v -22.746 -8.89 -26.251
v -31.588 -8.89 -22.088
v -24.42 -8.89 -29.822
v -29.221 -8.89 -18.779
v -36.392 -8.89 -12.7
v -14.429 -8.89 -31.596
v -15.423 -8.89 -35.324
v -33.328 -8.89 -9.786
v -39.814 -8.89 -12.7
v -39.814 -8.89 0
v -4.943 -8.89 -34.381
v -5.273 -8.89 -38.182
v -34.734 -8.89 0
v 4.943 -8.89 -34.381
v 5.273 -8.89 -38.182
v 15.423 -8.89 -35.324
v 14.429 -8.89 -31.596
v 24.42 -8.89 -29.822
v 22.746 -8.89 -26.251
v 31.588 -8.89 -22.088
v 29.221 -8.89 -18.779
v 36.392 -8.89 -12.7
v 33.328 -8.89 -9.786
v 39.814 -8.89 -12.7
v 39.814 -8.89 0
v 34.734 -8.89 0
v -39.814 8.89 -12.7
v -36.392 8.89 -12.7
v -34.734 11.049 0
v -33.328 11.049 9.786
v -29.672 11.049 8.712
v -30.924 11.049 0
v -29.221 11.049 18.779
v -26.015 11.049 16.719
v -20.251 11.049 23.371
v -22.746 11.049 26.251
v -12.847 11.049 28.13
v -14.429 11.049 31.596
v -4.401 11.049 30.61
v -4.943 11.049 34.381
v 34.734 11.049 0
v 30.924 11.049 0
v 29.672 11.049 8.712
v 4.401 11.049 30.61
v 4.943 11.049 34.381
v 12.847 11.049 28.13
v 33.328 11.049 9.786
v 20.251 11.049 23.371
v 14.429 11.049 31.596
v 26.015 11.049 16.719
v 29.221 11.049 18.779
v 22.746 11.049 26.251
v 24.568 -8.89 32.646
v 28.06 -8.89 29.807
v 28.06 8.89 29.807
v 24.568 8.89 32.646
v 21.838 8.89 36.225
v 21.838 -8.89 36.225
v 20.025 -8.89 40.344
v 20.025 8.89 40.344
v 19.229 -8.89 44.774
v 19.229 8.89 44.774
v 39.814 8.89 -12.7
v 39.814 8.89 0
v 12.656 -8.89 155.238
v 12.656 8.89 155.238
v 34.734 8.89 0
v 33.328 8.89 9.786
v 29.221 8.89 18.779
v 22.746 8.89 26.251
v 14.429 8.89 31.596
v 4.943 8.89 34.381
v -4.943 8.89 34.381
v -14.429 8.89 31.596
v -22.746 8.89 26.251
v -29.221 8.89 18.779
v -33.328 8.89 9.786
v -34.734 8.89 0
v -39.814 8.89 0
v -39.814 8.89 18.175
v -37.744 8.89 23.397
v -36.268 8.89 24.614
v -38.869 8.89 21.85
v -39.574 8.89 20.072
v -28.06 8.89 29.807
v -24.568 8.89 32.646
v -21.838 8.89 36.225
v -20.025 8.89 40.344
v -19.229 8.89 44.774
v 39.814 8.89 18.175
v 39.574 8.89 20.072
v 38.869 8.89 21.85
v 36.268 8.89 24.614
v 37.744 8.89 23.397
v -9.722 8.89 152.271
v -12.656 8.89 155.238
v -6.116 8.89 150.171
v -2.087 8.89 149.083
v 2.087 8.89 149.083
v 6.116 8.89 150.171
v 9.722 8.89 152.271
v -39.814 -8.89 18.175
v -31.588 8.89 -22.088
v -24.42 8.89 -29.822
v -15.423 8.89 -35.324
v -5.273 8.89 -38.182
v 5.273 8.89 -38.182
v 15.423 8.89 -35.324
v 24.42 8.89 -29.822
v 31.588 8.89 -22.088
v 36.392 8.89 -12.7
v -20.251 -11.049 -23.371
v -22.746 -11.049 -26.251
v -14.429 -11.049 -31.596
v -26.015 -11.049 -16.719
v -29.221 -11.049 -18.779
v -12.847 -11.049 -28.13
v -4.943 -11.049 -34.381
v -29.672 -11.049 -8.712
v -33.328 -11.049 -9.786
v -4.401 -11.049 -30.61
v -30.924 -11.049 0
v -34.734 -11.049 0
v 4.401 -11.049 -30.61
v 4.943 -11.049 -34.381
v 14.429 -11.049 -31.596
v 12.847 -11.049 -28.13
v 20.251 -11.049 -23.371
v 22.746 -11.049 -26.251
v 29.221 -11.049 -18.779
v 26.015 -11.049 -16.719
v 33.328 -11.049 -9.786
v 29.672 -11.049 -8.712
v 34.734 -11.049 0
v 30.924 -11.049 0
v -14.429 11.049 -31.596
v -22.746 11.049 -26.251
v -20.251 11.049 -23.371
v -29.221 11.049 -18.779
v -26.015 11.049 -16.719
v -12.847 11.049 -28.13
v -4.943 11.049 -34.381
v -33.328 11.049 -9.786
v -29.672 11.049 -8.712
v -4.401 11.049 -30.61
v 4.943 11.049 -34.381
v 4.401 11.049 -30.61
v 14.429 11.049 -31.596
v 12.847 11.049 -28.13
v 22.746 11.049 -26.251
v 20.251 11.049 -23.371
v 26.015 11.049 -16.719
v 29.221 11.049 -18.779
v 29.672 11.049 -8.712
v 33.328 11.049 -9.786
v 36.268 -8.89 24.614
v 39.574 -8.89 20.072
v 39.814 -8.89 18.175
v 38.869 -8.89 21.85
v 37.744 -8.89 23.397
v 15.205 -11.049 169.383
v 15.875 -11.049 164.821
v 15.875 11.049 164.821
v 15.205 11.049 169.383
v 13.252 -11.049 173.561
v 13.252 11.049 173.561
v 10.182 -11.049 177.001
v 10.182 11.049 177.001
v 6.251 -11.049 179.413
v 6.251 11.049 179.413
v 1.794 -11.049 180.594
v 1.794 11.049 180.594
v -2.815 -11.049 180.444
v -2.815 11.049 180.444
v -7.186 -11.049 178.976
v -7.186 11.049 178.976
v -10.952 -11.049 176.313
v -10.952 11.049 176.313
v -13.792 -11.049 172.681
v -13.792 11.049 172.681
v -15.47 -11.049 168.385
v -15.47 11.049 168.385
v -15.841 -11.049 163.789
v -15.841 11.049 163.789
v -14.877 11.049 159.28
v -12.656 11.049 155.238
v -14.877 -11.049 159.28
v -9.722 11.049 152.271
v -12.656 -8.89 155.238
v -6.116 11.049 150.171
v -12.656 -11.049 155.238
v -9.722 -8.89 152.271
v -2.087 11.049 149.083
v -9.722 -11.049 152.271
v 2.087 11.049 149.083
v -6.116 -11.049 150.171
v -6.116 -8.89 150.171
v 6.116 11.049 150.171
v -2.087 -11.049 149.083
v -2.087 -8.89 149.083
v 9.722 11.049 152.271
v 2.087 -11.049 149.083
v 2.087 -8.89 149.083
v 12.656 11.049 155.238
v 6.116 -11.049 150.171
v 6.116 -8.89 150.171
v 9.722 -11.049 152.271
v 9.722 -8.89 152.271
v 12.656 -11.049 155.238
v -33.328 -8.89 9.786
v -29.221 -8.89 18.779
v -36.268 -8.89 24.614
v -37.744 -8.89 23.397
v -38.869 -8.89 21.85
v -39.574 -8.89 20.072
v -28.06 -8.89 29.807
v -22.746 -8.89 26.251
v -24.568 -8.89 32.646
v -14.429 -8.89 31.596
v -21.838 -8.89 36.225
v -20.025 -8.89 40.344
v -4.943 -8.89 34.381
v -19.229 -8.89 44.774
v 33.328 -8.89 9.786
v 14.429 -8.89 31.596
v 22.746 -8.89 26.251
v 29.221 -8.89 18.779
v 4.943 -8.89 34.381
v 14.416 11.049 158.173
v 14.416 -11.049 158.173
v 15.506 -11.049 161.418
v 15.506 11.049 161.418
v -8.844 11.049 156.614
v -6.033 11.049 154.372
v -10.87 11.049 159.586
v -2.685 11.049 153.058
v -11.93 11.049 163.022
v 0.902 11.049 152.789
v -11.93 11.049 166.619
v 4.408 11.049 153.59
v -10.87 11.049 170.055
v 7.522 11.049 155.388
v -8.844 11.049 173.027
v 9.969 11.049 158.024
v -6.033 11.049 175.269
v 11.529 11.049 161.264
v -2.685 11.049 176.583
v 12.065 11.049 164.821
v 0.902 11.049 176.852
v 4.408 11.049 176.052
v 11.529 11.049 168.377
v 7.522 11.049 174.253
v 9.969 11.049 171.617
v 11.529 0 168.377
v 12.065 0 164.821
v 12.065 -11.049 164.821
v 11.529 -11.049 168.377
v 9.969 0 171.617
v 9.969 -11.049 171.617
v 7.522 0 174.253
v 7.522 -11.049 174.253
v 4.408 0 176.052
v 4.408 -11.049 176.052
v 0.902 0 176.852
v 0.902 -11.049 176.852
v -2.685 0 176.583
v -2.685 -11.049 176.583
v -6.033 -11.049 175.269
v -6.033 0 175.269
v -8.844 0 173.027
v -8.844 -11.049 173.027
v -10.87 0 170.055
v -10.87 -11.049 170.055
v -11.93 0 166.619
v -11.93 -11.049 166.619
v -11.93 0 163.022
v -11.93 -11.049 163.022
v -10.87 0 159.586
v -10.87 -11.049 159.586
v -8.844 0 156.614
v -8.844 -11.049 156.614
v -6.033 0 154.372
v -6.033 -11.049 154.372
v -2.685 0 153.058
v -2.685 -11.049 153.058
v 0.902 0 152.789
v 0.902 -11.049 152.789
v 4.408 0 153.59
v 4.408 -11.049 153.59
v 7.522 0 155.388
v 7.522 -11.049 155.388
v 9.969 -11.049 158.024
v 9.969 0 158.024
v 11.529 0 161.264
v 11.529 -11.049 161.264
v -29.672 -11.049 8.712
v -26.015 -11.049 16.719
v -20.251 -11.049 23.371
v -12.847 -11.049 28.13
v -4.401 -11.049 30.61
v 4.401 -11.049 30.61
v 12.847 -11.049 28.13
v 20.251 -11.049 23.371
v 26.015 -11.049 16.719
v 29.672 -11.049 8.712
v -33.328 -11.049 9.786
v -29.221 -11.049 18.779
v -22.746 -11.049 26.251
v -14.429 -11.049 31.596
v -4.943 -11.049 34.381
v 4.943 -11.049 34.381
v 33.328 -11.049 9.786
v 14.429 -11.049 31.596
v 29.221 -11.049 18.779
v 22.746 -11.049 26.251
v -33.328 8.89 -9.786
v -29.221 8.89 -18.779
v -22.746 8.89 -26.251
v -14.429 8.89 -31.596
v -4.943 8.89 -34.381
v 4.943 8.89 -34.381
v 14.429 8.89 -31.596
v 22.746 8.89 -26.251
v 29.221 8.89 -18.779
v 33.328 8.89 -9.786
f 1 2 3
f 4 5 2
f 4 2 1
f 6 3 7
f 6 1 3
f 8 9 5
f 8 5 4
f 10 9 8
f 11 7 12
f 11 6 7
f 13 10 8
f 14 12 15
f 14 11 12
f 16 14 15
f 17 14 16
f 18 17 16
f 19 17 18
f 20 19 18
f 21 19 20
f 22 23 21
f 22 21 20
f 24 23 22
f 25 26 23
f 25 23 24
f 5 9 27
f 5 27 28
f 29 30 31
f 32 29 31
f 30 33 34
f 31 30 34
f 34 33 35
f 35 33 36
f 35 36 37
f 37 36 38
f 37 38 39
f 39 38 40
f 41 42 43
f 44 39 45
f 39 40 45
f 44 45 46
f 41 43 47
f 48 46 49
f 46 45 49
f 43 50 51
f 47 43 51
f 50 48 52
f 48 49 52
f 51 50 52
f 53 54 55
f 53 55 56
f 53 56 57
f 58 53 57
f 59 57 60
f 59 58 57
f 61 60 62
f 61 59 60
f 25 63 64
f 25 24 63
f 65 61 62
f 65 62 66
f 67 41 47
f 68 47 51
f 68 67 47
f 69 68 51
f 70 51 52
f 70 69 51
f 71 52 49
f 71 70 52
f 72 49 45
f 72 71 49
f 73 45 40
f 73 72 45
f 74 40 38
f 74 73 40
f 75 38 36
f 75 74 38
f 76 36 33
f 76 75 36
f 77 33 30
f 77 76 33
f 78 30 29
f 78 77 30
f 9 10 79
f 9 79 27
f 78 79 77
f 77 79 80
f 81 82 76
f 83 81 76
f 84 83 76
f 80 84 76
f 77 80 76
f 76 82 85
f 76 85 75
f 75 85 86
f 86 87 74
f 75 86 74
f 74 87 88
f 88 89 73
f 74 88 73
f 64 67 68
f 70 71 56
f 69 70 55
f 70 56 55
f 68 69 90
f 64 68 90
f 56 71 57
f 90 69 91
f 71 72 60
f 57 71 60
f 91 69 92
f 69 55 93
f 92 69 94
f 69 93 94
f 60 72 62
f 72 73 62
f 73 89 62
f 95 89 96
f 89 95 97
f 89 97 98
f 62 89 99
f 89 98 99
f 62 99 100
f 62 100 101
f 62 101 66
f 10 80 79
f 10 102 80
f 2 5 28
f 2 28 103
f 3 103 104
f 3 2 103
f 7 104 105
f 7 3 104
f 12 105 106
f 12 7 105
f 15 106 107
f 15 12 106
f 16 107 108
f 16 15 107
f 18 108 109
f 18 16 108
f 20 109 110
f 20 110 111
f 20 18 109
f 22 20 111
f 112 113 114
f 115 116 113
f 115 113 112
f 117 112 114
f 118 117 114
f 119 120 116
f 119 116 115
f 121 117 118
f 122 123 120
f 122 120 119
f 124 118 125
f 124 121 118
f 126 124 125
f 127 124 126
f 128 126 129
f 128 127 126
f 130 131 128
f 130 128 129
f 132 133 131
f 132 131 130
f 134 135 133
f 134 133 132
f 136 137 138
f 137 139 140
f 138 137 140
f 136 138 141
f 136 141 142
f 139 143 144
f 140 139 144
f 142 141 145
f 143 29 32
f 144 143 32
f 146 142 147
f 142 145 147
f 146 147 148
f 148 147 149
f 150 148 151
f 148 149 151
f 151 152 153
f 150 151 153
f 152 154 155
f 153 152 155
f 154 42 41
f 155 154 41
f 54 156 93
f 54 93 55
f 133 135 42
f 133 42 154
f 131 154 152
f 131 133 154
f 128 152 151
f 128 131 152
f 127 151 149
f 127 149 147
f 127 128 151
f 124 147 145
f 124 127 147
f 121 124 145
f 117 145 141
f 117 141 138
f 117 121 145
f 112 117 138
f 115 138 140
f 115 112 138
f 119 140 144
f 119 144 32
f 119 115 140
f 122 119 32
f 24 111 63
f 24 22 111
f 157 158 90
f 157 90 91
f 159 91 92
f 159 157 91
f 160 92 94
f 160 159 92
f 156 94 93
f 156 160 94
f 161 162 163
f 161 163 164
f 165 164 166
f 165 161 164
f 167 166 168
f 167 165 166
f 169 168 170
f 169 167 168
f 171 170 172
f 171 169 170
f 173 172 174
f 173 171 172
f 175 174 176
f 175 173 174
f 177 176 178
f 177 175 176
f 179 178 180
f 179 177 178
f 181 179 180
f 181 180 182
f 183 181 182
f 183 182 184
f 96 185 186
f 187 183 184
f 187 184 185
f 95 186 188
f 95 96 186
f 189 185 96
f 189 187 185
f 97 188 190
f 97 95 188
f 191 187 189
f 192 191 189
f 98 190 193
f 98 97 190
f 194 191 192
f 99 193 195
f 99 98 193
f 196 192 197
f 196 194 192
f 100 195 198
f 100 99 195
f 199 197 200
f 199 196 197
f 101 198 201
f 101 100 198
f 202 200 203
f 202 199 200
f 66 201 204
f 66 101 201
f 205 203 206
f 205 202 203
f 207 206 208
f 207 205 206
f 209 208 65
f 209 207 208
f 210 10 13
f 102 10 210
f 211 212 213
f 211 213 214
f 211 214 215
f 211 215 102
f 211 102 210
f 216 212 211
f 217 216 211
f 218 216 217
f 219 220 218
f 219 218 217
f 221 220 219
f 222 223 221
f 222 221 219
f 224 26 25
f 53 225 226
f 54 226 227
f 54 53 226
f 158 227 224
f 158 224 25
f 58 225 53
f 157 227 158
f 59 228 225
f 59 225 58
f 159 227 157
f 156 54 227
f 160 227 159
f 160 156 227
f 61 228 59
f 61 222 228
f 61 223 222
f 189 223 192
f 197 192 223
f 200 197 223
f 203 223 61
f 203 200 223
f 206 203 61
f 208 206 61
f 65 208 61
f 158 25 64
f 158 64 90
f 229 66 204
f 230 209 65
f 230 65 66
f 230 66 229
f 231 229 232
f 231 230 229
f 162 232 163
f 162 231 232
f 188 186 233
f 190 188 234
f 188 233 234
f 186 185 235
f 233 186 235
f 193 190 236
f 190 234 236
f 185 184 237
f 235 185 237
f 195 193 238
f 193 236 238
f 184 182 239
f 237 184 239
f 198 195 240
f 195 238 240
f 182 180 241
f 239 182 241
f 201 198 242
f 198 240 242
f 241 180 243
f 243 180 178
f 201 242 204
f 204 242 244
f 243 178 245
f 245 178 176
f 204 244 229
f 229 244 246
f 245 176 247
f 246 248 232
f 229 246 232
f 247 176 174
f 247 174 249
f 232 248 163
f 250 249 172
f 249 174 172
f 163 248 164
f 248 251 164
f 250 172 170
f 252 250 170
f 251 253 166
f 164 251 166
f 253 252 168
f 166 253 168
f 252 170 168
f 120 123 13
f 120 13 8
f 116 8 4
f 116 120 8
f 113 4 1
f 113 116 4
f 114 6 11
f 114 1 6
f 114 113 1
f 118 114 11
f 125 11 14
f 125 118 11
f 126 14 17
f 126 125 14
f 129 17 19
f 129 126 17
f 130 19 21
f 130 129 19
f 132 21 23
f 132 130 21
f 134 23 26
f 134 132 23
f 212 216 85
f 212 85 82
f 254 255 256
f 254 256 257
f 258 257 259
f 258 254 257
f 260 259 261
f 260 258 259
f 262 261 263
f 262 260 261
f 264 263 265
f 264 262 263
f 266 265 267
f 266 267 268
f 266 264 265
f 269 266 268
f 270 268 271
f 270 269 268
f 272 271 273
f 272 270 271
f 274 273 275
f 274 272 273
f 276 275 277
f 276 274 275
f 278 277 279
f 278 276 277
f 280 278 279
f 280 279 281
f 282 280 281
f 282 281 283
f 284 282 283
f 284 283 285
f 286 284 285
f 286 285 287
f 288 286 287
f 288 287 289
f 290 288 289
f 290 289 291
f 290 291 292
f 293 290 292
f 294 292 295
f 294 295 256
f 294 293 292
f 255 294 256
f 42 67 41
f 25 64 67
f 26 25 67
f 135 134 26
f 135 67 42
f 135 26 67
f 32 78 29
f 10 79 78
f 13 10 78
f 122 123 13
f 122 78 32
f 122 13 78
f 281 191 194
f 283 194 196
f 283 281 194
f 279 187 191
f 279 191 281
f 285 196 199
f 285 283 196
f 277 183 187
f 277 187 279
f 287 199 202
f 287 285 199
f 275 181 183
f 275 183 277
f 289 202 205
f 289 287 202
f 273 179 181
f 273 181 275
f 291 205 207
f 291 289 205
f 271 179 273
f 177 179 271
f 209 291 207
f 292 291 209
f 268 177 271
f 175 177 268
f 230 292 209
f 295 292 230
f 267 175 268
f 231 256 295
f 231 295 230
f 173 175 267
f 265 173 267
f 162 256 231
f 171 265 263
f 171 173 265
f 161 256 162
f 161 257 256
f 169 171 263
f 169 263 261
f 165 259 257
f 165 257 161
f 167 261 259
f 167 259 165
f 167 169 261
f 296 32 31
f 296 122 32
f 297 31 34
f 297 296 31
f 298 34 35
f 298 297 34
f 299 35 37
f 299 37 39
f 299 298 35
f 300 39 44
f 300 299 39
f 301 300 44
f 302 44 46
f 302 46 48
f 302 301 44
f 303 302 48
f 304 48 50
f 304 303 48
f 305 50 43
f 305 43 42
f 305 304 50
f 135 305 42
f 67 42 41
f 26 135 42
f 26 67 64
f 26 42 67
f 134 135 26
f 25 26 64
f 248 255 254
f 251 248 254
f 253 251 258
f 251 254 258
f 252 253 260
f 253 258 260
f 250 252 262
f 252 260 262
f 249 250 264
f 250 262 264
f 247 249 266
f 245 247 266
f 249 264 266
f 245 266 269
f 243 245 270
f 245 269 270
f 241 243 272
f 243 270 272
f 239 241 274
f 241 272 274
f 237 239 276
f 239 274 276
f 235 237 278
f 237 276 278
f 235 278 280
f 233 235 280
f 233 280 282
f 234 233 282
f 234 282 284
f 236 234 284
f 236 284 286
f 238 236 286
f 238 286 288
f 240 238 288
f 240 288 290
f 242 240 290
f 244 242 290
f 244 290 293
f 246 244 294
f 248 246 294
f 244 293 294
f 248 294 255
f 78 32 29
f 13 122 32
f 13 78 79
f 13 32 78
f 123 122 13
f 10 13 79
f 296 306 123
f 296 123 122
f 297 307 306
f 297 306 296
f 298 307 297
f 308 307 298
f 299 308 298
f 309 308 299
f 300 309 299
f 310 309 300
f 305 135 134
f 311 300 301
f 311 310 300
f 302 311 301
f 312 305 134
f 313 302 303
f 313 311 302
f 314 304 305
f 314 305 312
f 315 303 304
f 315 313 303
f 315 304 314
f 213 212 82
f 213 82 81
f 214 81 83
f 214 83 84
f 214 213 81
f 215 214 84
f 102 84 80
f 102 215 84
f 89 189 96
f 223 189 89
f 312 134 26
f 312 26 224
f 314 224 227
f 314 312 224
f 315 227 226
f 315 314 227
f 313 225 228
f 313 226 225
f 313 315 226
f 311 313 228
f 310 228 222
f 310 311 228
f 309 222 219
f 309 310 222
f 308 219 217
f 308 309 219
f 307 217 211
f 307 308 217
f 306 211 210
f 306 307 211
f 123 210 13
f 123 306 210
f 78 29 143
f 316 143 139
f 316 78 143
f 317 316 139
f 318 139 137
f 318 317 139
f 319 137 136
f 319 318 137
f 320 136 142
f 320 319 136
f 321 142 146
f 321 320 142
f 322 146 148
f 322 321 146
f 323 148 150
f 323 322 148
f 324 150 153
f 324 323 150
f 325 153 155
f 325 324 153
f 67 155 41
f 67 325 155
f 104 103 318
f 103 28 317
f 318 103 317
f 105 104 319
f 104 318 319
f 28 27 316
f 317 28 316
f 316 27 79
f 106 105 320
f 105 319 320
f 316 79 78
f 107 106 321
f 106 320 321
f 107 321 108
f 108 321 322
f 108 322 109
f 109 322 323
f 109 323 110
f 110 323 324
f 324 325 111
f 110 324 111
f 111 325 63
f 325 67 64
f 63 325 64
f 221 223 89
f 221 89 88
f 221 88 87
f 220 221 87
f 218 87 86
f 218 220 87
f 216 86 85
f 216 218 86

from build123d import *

# Parameters (mm, degrees)
F1_DEPTH = 11.049
F2_DEPTH = 8.89
F0_R     = 12.065
F3_DEPTH = 11.049
F4_DEPTH = 11.049
F5_DEPTH = 8.89


with BuildPart() as f1:
    # F0 (on Front) → F1 (new body, symmetric)
    with BuildSketch(Plane.XZ):
        with BuildLine():
            ThreePointArc((-30.9245, 0), (0, 30.9245), (30.9245, 0))
            Line((30.9245, 0), (34.7345, 0))
            ThreePointArc((34.7345, 0), (0, 34.7345), (-34.7345, 0))
            Line((-34.7345, 0), (-30.9245, 0))
        make_face()
    extrude(amount=F1_DEPTH, both=True)

    # F0 (on Front) → F2 (join, symmetric)
    with BuildSketch(Plane.XZ):
        with BuildLine():
            ThreePointArc((-34.7345, 0), (0, 34.7345), (34.7345, 0))
            Line((34.7345, 0), (39.8145, 0))
            Line((39.8145, 0), (39.8145, 18.174736774))
            ThreePointArc((39.8145, 18.174736774), (38.8693796529, 21.8503838762), (36.2684680788, 24.6142386253))
            Line((36.2684680788, 24.6142386253), (28.0604028001, 29.8070930892))
            ThreePointArc((28.0604028001, 29.8070930892), (21.8384993627, 36.2250090023), (19.2289533596, 44.7743947528))
            Line((19.2289533596, 44.7743947528), (12.6564985929, 155.2378723942))
            ThreePointArc((12.6564985929, 155.2378723942), (0, 148.9456), (-12.6564985929, 155.2378723942))
            Line((-12.6564985929, 155.2378723942), (-19.2289533596, 44.7743947528))
            ThreePointArc((-19.2289533596, 44.7743947528), (-21.8384993627, 36.2250090023), (-28.0604028001, 29.8070930892))
            Line((-28.0604028001, 29.8070930892), (-36.2684680788, 24.6142386253))
            ThreePointArc((-36.2684680788, 24.6142386253), (-38.8693796529, 21.8503838762), (-39.8145, 18.174736774))
            Line((-39.8145, 18.174736774), (-39.8145, 0))
            Line((-39.8145, 0), (-34.7345, 0))
        make_face()
    extrude(amount=F2_DEPTH, both=True)

    # F0 (on Front) → F3 (join, symmetric)
    with BuildSketch(Plane.XZ):
        with BuildLine():
            ThreePointArc((-12.6564985929, 155.2378723942), (0, 148.9456), (12.6564985929, 155.2378723942))
            ThreePointArc((12.6564985929, 155.2378723942), (15.048879363, 159.7662103318), (15.875, 164.8206))
            ThreePointArc((15.875, 164.8206), (-5.0543896682, 179.869479363), (-12.6564985929, 155.2378723942))
        make_face()
        with Locations((0, 164.8206)):
            Circle(F0_R, mode=Mode.SUBTRACT)
    extrude(amount=F3_DEPTH, both=True)


with BuildPart() as f4:
    # F0 (on Front) → F4 (new body, symmetric)
    with BuildSketch(Plane.XZ):
        with BuildLine():
            Line((34.7345, 0), (30.9245, 0))
            ThreePointArc((30.9245, 0), (0, -30.9245), (-30.9245, 0))
            Line((-30.9245, 0), (-34.7345, 0))
            ThreePointArc((-34.7345, 0), (0, -34.7345), (34.7345, 0))
        make_face()
    extrude(amount=F4_DEPTH, both=True)

    # F0 (on Front) → F5 (join, symmetric)
    with BuildSketch(Plane.XZ):
        with BuildLine():
            Line((39.8145, 0), (34.7345, 0))
            ThreePointArc((34.7345, 0), (0, -34.7345), (-34.7345, 0))
            Line((-34.7345, 0), (-39.8145, 0))
            Line((-39.8145, 0), (-39.8145, -12.7))
            Line((-39.8145, -12.7), (-36.3921486072, -12.7))
            ThreePointArc((-36.3921486072, -12.7), (0, -38.5445), (36.3921486072, -12.7))
            Line((36.3921486072, -12.7), (39.8145, -12.7))
            Line((39.8145, -12.7), (39.8145, 0))
        make_face()
    extrude(amount=F5_DEPTH, both=True)


solid = Compound([f1.part, f4.part])
